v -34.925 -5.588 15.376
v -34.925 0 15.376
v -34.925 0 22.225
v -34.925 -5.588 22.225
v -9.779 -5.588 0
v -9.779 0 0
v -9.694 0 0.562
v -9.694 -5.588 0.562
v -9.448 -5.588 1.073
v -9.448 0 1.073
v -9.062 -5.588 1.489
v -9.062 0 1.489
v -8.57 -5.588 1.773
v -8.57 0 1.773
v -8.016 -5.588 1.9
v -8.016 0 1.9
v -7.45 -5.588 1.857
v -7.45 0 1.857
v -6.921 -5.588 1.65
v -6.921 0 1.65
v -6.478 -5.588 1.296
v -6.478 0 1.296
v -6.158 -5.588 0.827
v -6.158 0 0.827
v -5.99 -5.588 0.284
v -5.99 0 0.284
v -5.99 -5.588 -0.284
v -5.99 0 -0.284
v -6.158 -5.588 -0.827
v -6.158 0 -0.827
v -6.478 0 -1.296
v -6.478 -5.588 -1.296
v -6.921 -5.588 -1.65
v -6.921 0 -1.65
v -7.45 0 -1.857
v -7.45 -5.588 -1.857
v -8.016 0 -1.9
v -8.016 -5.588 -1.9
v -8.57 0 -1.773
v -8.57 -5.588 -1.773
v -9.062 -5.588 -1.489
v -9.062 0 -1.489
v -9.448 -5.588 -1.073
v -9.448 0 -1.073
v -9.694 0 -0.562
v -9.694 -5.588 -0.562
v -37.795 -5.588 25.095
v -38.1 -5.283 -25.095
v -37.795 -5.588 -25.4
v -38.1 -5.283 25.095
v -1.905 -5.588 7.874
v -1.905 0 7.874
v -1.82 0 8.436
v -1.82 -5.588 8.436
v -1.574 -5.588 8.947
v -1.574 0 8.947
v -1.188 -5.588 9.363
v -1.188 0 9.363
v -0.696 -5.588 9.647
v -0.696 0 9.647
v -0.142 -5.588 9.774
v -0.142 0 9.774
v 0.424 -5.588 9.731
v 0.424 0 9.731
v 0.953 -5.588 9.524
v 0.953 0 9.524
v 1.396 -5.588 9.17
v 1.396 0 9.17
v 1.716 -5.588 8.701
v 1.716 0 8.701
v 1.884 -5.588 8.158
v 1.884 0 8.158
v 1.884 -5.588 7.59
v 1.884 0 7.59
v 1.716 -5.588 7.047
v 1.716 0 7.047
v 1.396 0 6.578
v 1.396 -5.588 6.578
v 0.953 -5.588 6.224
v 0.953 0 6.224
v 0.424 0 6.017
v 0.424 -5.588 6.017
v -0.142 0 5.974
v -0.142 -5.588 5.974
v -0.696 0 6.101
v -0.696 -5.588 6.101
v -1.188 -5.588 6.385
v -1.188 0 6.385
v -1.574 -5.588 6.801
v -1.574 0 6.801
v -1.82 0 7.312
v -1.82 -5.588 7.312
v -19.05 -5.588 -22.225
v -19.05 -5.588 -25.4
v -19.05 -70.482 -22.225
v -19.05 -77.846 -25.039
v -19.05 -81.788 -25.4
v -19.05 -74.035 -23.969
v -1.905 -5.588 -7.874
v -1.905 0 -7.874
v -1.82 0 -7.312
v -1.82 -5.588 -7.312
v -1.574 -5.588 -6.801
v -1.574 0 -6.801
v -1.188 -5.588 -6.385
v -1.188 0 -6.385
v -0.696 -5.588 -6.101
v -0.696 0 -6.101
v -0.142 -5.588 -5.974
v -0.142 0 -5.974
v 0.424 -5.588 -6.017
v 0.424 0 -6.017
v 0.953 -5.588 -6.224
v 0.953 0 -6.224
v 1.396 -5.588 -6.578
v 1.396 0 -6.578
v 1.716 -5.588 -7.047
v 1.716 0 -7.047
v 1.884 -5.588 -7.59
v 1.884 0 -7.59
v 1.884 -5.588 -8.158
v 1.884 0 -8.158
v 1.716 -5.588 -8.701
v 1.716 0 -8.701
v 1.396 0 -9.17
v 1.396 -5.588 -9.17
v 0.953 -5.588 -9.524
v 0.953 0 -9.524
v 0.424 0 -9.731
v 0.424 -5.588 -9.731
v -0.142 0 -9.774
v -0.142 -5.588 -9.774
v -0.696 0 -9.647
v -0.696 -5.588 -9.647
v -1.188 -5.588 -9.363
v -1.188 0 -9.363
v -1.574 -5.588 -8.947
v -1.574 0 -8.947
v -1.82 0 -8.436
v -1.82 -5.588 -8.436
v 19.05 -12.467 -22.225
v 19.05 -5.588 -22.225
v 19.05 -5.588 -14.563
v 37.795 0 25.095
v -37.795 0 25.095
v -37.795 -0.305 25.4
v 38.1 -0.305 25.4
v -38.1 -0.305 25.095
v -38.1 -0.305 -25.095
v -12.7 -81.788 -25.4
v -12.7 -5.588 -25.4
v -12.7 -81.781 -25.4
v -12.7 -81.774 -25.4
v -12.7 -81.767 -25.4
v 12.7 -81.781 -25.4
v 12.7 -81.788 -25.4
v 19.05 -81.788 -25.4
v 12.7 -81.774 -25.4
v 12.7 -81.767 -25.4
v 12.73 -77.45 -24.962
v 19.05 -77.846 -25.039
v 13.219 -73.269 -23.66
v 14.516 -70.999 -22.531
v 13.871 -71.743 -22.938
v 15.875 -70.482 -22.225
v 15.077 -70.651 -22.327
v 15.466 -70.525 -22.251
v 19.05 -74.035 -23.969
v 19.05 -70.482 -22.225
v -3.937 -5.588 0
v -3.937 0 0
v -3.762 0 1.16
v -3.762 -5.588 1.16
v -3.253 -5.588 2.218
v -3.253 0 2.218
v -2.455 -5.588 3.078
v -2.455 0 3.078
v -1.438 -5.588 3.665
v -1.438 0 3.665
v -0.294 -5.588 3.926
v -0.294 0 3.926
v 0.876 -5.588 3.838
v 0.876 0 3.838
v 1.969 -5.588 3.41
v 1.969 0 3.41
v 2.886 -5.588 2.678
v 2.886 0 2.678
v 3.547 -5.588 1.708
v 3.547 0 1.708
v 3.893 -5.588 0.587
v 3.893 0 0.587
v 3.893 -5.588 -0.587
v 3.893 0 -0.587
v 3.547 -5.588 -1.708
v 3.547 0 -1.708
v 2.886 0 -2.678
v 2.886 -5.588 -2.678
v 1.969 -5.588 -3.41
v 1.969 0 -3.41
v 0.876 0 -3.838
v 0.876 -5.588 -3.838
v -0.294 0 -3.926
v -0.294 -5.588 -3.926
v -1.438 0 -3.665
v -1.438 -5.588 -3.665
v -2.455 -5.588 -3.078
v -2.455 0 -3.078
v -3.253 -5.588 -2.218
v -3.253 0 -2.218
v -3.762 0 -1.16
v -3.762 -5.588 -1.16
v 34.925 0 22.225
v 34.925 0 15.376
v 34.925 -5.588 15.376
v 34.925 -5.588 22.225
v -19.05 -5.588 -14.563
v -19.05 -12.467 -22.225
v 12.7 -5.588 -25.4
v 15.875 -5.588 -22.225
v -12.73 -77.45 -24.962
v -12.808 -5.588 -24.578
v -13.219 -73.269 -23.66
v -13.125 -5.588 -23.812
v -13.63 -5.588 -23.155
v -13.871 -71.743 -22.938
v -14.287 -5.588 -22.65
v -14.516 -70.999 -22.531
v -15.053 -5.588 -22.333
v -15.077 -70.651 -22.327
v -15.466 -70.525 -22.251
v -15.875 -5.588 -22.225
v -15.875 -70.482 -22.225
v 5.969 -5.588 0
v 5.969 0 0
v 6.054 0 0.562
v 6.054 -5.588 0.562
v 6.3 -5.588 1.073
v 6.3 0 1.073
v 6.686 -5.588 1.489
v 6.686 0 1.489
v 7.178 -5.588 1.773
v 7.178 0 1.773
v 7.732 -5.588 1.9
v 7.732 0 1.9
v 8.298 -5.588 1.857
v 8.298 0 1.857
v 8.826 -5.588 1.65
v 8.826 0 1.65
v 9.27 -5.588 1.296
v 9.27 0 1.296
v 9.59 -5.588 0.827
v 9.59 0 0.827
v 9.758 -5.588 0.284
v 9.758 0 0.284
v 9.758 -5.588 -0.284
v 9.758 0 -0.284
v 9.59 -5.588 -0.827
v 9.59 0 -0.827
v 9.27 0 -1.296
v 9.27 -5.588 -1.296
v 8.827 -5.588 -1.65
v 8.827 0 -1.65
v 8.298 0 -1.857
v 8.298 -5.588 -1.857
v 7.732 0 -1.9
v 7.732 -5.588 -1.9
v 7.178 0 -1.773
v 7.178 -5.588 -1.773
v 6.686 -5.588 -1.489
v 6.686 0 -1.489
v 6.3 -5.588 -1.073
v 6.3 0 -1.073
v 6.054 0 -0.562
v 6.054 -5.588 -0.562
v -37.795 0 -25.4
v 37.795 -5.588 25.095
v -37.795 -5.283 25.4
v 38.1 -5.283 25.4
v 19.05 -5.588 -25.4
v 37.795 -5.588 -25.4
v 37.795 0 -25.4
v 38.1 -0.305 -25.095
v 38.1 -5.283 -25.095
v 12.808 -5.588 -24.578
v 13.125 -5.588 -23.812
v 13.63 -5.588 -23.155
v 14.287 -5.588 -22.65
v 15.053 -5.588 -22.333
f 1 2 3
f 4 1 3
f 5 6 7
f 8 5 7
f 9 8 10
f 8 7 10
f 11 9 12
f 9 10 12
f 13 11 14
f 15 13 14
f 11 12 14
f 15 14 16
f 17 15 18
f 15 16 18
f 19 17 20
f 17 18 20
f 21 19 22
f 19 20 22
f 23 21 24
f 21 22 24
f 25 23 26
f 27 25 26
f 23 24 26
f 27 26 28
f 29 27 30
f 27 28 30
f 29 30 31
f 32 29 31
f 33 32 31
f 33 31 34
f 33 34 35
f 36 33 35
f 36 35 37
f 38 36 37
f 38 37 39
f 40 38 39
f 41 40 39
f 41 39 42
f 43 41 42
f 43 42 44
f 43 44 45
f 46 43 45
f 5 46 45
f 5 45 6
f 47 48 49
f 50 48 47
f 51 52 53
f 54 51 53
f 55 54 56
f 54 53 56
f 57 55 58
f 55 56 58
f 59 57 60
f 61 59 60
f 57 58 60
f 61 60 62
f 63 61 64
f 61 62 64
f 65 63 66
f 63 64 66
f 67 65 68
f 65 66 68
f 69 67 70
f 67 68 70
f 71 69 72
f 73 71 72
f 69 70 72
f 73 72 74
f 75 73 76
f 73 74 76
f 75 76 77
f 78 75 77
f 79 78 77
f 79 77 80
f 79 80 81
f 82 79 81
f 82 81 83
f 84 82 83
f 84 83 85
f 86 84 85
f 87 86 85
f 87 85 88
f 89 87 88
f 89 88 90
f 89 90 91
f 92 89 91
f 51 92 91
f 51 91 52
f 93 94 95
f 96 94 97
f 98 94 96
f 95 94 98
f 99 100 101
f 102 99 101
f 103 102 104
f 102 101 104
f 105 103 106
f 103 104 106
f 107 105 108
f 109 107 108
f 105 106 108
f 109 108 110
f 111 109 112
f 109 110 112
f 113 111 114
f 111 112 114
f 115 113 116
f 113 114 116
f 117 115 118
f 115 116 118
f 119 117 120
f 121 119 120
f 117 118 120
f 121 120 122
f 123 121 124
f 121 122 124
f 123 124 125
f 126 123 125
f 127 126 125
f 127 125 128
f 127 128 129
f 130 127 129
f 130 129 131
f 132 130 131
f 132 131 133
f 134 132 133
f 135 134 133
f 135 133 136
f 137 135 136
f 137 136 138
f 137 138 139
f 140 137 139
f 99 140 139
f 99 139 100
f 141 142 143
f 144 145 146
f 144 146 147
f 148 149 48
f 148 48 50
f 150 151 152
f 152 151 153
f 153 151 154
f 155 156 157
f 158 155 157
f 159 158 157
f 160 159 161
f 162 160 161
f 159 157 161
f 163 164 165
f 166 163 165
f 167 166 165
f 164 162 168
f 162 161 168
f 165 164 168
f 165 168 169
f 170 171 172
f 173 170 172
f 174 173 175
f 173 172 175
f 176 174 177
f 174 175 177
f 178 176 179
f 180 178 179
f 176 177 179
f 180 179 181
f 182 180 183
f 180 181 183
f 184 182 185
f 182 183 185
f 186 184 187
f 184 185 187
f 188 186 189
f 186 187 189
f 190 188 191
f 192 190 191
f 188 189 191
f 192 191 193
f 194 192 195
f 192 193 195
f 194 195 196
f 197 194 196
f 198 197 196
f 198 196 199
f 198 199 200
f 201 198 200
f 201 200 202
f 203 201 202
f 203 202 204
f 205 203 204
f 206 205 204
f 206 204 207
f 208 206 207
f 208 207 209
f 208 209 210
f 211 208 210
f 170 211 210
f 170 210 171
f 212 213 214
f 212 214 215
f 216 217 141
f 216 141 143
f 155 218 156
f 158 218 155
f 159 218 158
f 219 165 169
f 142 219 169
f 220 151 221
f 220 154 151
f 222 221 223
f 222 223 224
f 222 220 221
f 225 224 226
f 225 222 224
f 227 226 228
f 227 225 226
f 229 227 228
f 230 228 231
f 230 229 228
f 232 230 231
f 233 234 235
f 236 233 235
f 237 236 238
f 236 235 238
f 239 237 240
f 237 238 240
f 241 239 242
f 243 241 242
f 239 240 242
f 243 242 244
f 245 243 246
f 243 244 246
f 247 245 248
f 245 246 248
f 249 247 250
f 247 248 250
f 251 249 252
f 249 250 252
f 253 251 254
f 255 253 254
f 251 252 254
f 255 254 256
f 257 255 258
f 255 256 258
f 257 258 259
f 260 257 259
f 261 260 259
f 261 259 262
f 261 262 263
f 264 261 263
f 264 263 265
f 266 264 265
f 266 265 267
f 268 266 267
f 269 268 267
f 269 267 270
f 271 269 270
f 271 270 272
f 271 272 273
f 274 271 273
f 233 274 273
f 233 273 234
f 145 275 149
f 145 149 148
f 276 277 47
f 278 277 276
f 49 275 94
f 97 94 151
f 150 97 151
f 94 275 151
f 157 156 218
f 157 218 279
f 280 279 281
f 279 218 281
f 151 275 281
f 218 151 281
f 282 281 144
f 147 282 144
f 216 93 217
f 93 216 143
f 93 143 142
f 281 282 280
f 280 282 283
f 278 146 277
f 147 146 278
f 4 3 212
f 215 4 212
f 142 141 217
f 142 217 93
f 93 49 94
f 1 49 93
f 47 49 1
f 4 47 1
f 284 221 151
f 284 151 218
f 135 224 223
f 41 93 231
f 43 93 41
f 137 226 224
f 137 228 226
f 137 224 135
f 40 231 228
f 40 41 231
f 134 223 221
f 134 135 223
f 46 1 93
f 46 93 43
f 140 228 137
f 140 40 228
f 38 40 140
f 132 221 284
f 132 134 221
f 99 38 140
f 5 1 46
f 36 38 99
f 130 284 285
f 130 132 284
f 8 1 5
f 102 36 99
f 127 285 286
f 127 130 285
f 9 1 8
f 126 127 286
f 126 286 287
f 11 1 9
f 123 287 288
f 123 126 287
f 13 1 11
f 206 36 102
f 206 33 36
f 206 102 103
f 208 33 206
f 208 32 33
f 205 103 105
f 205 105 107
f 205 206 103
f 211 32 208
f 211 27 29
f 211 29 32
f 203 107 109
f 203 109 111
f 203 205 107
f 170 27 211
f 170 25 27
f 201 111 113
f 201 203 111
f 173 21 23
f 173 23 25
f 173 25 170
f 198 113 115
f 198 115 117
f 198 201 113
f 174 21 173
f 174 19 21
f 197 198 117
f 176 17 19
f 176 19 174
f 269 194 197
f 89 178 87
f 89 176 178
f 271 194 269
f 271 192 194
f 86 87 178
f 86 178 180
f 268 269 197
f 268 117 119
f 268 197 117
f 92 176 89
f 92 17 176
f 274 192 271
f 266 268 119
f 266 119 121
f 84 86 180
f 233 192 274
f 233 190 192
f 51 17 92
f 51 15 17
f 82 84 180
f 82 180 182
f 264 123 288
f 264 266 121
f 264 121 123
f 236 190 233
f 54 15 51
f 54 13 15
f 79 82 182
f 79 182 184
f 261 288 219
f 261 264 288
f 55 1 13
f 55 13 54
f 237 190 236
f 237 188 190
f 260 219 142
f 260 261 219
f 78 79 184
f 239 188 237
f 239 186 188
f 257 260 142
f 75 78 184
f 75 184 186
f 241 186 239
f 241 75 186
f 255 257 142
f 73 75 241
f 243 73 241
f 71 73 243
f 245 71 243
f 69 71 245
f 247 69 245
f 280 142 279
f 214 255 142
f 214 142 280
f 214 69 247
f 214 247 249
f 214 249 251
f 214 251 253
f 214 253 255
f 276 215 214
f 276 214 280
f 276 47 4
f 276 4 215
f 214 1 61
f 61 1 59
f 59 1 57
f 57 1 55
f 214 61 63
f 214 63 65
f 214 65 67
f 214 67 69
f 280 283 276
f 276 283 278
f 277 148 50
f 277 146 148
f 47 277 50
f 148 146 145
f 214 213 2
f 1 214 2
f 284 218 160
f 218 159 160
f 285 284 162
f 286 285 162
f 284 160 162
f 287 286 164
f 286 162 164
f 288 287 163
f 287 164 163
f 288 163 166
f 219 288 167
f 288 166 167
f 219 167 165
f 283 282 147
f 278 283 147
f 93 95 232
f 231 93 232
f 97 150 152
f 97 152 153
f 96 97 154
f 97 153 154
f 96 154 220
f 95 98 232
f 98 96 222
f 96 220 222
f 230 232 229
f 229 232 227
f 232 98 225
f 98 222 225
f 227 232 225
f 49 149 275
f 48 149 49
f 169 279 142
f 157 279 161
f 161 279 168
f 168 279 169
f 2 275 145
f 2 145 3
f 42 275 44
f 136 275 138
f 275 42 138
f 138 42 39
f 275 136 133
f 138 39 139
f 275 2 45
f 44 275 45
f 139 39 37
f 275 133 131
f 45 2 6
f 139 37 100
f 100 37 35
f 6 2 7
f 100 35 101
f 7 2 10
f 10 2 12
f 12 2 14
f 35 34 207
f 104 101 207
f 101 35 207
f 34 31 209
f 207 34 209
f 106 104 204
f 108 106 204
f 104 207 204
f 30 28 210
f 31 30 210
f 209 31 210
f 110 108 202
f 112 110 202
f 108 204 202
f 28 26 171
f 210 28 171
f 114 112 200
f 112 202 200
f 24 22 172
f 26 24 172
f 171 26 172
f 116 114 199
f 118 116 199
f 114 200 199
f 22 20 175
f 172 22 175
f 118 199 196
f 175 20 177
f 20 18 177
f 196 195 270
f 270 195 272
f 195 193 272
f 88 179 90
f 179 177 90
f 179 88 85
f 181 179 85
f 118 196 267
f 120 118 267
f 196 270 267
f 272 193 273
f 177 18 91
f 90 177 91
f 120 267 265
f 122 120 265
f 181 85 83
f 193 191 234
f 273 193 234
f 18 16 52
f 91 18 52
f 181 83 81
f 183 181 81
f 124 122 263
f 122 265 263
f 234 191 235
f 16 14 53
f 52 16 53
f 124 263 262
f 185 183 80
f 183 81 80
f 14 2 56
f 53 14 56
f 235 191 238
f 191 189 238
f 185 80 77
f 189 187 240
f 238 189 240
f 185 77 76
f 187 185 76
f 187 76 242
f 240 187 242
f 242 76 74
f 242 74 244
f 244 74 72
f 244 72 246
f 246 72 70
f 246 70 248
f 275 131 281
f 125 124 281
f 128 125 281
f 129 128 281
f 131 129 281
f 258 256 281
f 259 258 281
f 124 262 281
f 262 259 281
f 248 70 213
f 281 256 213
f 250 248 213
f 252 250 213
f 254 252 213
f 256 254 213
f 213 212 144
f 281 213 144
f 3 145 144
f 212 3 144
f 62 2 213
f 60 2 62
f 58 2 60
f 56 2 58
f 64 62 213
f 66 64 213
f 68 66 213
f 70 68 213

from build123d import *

# Parameters (mm, degrees)
F0_W      = 76.2
F0_H      = 50.8
F1_DEPTH  = 5.588
F2_W      = 6.35
F2_H      = 76.2
F3_DEPTH  = 3.175
F5_DEPTH  = 38.1
F6_W      = 47.7035964723
F6_H      = 3.175
F7_DEPTH  = 254
F8_R      = 3.937
F8_R_2    = 1.905
F9_DEPTH  = 25.4
F10_W     = 69.2231629074
F10_H     = 6.8492060885
F10_W_2   = 0.6268370926
F11_DEPTH = 25.4
F13_DEPTH = 254
F14_R     = 3.17499
F15_SIZE  = 0.3048


# Not quite as in the source:
# - a fillet or chamfer is up to 0.001 mm smaller than in the source, because OpenCascade refuses the exact size


with BuildPart() as f1:
    # F0 (on Front) → F1 (new body)
    with BuildSketch(Plane.XZ):
        Rectangle(F0_W, F0_H)
    extrude(amount=F1_DEPTH)

    # F2 (on face) → F3 (join)
    with BuildSketch(Plane(origin=(0, 0, -25.4), x_dir=(1, 0, 0), z_dir=(0, 0, -1))):
        with Locations((-15.875, 43.688)):
            Rectangle(F2_W, F2_H)
        with Locations((15.875, 43.688)):
            Rectangle(F2_W, F2_H)
    extrude(amount=-F3_DEPTH)

    # F8 (on face) → F9 (cut)
    with BuildSketch(Plane(origin=(0, 0, 0), x_dir=(-1, 0, 0), z_dir=(0, 1, 0))):
        Circle(F8_R)
        with Locations((0, 7.874)):
            Circle(F8_R_2)
        with Locations((0, -7.874)):
            Circle(F8_R_2)
        with Locations((7.874, 0)):
            Circle(F8_R_2)
        with Locations((-7.874, 0)):
            Circle(F8_R_2)
    extrude(amount=-F9_DEPTH, mode=Mode.SUBTRACT)

    # F10 (on face) → F11 (cut)
    with BuildSketch(Plane(origin=(0, 0, 0), x_dir=(-1, 0, 0), z_dir=(0, 1, 0))):
        with Locations((-0.3134185463, 18.8003969558)):
            Rectangle(F10_W, F10_H)
        with Locations((34.6115814537, 18.8003969558)):
            Rectangle(F10_W_2, F10_H)
    extrude(amount=-F11_DEPTH, mode=Mode.SUBTRACT)

    # F12 (on face) → F13 (cut)
    with BuildSketch(Plane.YZ.offset(19.05)):
        with BuildLine():
            ThreePointArc((-81.788, -25.4), (-75.9161354287, -24.5911900097), (-70.4816058278, -22.225))
            Line((-70.4816058278, -22.225), (-81.788, -22.225))
            Line((-81.788, -22.225), (-81.788, -25.4))
        make_face()
    extrude(amount=-F13_DEPTH, mode=Mode.SUBTRACT)

    # F14 (radius 3.175 in the source; OpenCascade refuses exactly that, so slightly less here)
    f14_edges = [f1.edges().sort_by_distance(p)[0] for p in [
        (-12.7, -38.034803, -22.225),
        (12.7, -38.034803, -22.225),
    ]]
    fillet(f14_edges, radius=F14_R)

    # F15
    f15_edges = [f1.edges().sort_by_distance(p)[0] for p in [
        (-38.1, -2.794, 25.4),
        (0, -5.588, 25.4),
        (-38.1, -5.588, 0),
        (38.1, -5.588, 0),
        (0, 0, 25.4),
        (38.1, 0, 0),
        (-38.1, 0, 0),
        (-38.1, -2.794, -25.4),
        (38.1, -2.794, -25.4),
    ]]
    chamfer(f15_edges, length=F15_SIZE)


with BuildPart() as f5:
    # F4 (on face) → F5 (new body)
    with BuildSketch(Plane(origin=(-19.05, 0, 0), x_dir=(0, -1, 0), z_dir=(-1, 0, 0))):
        Polygon((5.588, -22.225), (5.588, -25.4), (81.788, -25.4), (81.788, -22.225), (12.4667482451, -22.225), align=None)
        Polygon((5.588, -14.562738128), (5.588, -22.225), (12.4667482451, -22.225), align=None)
    extrude(amount=-F5_DEPTH)

    # F6 (on face) → F7 (cut)
    with BuildSketch(Plane(origin=(-19.05, 0, 0), x_dir=(0, -1, 0), z_dir=(-1, 0, 0))):
        with BuildLine():
            ThreePointArc((61.4126552725, -25.4), (57.2639609503, -24.038009454), (53.2915964723, -22.225))
            Line((53.2915964723, -22.225), (53.2915964723, -25.4))
            Line((53.2915964723, -25.4), (61.4126552725, -25.4))
        make_face()
        with BuildLine():
            Line((81.788, -22.225), (53.2915964723, -22.225))
            ThreePointArc((53.2915964723, -22.225), (57.2639609503, -24.038009454), (61.4126552725, -25.4))
            Line((61.4126552725, -25.4), (81.788, -25.4))
            Line((81.788, -25.4), (81.788, -22.225))
        make_face()
        with Locations((29.4397982361, -23.8125)):
            Rectangle(F6_W, F6_H)
        with BuildLine():
            Line((81.788, -25.4), (61.4126552725, -25.4))
            ThreePointArc((61.4126552725, -25.4), (71.6003276362, -26.7408633781), (81.788, -25.4))
        make_face()
    extrude(amount=-F7_DEPTH, mode=Mode.SUBTRACT)


solid = Compound([f1.part, f5.part])
